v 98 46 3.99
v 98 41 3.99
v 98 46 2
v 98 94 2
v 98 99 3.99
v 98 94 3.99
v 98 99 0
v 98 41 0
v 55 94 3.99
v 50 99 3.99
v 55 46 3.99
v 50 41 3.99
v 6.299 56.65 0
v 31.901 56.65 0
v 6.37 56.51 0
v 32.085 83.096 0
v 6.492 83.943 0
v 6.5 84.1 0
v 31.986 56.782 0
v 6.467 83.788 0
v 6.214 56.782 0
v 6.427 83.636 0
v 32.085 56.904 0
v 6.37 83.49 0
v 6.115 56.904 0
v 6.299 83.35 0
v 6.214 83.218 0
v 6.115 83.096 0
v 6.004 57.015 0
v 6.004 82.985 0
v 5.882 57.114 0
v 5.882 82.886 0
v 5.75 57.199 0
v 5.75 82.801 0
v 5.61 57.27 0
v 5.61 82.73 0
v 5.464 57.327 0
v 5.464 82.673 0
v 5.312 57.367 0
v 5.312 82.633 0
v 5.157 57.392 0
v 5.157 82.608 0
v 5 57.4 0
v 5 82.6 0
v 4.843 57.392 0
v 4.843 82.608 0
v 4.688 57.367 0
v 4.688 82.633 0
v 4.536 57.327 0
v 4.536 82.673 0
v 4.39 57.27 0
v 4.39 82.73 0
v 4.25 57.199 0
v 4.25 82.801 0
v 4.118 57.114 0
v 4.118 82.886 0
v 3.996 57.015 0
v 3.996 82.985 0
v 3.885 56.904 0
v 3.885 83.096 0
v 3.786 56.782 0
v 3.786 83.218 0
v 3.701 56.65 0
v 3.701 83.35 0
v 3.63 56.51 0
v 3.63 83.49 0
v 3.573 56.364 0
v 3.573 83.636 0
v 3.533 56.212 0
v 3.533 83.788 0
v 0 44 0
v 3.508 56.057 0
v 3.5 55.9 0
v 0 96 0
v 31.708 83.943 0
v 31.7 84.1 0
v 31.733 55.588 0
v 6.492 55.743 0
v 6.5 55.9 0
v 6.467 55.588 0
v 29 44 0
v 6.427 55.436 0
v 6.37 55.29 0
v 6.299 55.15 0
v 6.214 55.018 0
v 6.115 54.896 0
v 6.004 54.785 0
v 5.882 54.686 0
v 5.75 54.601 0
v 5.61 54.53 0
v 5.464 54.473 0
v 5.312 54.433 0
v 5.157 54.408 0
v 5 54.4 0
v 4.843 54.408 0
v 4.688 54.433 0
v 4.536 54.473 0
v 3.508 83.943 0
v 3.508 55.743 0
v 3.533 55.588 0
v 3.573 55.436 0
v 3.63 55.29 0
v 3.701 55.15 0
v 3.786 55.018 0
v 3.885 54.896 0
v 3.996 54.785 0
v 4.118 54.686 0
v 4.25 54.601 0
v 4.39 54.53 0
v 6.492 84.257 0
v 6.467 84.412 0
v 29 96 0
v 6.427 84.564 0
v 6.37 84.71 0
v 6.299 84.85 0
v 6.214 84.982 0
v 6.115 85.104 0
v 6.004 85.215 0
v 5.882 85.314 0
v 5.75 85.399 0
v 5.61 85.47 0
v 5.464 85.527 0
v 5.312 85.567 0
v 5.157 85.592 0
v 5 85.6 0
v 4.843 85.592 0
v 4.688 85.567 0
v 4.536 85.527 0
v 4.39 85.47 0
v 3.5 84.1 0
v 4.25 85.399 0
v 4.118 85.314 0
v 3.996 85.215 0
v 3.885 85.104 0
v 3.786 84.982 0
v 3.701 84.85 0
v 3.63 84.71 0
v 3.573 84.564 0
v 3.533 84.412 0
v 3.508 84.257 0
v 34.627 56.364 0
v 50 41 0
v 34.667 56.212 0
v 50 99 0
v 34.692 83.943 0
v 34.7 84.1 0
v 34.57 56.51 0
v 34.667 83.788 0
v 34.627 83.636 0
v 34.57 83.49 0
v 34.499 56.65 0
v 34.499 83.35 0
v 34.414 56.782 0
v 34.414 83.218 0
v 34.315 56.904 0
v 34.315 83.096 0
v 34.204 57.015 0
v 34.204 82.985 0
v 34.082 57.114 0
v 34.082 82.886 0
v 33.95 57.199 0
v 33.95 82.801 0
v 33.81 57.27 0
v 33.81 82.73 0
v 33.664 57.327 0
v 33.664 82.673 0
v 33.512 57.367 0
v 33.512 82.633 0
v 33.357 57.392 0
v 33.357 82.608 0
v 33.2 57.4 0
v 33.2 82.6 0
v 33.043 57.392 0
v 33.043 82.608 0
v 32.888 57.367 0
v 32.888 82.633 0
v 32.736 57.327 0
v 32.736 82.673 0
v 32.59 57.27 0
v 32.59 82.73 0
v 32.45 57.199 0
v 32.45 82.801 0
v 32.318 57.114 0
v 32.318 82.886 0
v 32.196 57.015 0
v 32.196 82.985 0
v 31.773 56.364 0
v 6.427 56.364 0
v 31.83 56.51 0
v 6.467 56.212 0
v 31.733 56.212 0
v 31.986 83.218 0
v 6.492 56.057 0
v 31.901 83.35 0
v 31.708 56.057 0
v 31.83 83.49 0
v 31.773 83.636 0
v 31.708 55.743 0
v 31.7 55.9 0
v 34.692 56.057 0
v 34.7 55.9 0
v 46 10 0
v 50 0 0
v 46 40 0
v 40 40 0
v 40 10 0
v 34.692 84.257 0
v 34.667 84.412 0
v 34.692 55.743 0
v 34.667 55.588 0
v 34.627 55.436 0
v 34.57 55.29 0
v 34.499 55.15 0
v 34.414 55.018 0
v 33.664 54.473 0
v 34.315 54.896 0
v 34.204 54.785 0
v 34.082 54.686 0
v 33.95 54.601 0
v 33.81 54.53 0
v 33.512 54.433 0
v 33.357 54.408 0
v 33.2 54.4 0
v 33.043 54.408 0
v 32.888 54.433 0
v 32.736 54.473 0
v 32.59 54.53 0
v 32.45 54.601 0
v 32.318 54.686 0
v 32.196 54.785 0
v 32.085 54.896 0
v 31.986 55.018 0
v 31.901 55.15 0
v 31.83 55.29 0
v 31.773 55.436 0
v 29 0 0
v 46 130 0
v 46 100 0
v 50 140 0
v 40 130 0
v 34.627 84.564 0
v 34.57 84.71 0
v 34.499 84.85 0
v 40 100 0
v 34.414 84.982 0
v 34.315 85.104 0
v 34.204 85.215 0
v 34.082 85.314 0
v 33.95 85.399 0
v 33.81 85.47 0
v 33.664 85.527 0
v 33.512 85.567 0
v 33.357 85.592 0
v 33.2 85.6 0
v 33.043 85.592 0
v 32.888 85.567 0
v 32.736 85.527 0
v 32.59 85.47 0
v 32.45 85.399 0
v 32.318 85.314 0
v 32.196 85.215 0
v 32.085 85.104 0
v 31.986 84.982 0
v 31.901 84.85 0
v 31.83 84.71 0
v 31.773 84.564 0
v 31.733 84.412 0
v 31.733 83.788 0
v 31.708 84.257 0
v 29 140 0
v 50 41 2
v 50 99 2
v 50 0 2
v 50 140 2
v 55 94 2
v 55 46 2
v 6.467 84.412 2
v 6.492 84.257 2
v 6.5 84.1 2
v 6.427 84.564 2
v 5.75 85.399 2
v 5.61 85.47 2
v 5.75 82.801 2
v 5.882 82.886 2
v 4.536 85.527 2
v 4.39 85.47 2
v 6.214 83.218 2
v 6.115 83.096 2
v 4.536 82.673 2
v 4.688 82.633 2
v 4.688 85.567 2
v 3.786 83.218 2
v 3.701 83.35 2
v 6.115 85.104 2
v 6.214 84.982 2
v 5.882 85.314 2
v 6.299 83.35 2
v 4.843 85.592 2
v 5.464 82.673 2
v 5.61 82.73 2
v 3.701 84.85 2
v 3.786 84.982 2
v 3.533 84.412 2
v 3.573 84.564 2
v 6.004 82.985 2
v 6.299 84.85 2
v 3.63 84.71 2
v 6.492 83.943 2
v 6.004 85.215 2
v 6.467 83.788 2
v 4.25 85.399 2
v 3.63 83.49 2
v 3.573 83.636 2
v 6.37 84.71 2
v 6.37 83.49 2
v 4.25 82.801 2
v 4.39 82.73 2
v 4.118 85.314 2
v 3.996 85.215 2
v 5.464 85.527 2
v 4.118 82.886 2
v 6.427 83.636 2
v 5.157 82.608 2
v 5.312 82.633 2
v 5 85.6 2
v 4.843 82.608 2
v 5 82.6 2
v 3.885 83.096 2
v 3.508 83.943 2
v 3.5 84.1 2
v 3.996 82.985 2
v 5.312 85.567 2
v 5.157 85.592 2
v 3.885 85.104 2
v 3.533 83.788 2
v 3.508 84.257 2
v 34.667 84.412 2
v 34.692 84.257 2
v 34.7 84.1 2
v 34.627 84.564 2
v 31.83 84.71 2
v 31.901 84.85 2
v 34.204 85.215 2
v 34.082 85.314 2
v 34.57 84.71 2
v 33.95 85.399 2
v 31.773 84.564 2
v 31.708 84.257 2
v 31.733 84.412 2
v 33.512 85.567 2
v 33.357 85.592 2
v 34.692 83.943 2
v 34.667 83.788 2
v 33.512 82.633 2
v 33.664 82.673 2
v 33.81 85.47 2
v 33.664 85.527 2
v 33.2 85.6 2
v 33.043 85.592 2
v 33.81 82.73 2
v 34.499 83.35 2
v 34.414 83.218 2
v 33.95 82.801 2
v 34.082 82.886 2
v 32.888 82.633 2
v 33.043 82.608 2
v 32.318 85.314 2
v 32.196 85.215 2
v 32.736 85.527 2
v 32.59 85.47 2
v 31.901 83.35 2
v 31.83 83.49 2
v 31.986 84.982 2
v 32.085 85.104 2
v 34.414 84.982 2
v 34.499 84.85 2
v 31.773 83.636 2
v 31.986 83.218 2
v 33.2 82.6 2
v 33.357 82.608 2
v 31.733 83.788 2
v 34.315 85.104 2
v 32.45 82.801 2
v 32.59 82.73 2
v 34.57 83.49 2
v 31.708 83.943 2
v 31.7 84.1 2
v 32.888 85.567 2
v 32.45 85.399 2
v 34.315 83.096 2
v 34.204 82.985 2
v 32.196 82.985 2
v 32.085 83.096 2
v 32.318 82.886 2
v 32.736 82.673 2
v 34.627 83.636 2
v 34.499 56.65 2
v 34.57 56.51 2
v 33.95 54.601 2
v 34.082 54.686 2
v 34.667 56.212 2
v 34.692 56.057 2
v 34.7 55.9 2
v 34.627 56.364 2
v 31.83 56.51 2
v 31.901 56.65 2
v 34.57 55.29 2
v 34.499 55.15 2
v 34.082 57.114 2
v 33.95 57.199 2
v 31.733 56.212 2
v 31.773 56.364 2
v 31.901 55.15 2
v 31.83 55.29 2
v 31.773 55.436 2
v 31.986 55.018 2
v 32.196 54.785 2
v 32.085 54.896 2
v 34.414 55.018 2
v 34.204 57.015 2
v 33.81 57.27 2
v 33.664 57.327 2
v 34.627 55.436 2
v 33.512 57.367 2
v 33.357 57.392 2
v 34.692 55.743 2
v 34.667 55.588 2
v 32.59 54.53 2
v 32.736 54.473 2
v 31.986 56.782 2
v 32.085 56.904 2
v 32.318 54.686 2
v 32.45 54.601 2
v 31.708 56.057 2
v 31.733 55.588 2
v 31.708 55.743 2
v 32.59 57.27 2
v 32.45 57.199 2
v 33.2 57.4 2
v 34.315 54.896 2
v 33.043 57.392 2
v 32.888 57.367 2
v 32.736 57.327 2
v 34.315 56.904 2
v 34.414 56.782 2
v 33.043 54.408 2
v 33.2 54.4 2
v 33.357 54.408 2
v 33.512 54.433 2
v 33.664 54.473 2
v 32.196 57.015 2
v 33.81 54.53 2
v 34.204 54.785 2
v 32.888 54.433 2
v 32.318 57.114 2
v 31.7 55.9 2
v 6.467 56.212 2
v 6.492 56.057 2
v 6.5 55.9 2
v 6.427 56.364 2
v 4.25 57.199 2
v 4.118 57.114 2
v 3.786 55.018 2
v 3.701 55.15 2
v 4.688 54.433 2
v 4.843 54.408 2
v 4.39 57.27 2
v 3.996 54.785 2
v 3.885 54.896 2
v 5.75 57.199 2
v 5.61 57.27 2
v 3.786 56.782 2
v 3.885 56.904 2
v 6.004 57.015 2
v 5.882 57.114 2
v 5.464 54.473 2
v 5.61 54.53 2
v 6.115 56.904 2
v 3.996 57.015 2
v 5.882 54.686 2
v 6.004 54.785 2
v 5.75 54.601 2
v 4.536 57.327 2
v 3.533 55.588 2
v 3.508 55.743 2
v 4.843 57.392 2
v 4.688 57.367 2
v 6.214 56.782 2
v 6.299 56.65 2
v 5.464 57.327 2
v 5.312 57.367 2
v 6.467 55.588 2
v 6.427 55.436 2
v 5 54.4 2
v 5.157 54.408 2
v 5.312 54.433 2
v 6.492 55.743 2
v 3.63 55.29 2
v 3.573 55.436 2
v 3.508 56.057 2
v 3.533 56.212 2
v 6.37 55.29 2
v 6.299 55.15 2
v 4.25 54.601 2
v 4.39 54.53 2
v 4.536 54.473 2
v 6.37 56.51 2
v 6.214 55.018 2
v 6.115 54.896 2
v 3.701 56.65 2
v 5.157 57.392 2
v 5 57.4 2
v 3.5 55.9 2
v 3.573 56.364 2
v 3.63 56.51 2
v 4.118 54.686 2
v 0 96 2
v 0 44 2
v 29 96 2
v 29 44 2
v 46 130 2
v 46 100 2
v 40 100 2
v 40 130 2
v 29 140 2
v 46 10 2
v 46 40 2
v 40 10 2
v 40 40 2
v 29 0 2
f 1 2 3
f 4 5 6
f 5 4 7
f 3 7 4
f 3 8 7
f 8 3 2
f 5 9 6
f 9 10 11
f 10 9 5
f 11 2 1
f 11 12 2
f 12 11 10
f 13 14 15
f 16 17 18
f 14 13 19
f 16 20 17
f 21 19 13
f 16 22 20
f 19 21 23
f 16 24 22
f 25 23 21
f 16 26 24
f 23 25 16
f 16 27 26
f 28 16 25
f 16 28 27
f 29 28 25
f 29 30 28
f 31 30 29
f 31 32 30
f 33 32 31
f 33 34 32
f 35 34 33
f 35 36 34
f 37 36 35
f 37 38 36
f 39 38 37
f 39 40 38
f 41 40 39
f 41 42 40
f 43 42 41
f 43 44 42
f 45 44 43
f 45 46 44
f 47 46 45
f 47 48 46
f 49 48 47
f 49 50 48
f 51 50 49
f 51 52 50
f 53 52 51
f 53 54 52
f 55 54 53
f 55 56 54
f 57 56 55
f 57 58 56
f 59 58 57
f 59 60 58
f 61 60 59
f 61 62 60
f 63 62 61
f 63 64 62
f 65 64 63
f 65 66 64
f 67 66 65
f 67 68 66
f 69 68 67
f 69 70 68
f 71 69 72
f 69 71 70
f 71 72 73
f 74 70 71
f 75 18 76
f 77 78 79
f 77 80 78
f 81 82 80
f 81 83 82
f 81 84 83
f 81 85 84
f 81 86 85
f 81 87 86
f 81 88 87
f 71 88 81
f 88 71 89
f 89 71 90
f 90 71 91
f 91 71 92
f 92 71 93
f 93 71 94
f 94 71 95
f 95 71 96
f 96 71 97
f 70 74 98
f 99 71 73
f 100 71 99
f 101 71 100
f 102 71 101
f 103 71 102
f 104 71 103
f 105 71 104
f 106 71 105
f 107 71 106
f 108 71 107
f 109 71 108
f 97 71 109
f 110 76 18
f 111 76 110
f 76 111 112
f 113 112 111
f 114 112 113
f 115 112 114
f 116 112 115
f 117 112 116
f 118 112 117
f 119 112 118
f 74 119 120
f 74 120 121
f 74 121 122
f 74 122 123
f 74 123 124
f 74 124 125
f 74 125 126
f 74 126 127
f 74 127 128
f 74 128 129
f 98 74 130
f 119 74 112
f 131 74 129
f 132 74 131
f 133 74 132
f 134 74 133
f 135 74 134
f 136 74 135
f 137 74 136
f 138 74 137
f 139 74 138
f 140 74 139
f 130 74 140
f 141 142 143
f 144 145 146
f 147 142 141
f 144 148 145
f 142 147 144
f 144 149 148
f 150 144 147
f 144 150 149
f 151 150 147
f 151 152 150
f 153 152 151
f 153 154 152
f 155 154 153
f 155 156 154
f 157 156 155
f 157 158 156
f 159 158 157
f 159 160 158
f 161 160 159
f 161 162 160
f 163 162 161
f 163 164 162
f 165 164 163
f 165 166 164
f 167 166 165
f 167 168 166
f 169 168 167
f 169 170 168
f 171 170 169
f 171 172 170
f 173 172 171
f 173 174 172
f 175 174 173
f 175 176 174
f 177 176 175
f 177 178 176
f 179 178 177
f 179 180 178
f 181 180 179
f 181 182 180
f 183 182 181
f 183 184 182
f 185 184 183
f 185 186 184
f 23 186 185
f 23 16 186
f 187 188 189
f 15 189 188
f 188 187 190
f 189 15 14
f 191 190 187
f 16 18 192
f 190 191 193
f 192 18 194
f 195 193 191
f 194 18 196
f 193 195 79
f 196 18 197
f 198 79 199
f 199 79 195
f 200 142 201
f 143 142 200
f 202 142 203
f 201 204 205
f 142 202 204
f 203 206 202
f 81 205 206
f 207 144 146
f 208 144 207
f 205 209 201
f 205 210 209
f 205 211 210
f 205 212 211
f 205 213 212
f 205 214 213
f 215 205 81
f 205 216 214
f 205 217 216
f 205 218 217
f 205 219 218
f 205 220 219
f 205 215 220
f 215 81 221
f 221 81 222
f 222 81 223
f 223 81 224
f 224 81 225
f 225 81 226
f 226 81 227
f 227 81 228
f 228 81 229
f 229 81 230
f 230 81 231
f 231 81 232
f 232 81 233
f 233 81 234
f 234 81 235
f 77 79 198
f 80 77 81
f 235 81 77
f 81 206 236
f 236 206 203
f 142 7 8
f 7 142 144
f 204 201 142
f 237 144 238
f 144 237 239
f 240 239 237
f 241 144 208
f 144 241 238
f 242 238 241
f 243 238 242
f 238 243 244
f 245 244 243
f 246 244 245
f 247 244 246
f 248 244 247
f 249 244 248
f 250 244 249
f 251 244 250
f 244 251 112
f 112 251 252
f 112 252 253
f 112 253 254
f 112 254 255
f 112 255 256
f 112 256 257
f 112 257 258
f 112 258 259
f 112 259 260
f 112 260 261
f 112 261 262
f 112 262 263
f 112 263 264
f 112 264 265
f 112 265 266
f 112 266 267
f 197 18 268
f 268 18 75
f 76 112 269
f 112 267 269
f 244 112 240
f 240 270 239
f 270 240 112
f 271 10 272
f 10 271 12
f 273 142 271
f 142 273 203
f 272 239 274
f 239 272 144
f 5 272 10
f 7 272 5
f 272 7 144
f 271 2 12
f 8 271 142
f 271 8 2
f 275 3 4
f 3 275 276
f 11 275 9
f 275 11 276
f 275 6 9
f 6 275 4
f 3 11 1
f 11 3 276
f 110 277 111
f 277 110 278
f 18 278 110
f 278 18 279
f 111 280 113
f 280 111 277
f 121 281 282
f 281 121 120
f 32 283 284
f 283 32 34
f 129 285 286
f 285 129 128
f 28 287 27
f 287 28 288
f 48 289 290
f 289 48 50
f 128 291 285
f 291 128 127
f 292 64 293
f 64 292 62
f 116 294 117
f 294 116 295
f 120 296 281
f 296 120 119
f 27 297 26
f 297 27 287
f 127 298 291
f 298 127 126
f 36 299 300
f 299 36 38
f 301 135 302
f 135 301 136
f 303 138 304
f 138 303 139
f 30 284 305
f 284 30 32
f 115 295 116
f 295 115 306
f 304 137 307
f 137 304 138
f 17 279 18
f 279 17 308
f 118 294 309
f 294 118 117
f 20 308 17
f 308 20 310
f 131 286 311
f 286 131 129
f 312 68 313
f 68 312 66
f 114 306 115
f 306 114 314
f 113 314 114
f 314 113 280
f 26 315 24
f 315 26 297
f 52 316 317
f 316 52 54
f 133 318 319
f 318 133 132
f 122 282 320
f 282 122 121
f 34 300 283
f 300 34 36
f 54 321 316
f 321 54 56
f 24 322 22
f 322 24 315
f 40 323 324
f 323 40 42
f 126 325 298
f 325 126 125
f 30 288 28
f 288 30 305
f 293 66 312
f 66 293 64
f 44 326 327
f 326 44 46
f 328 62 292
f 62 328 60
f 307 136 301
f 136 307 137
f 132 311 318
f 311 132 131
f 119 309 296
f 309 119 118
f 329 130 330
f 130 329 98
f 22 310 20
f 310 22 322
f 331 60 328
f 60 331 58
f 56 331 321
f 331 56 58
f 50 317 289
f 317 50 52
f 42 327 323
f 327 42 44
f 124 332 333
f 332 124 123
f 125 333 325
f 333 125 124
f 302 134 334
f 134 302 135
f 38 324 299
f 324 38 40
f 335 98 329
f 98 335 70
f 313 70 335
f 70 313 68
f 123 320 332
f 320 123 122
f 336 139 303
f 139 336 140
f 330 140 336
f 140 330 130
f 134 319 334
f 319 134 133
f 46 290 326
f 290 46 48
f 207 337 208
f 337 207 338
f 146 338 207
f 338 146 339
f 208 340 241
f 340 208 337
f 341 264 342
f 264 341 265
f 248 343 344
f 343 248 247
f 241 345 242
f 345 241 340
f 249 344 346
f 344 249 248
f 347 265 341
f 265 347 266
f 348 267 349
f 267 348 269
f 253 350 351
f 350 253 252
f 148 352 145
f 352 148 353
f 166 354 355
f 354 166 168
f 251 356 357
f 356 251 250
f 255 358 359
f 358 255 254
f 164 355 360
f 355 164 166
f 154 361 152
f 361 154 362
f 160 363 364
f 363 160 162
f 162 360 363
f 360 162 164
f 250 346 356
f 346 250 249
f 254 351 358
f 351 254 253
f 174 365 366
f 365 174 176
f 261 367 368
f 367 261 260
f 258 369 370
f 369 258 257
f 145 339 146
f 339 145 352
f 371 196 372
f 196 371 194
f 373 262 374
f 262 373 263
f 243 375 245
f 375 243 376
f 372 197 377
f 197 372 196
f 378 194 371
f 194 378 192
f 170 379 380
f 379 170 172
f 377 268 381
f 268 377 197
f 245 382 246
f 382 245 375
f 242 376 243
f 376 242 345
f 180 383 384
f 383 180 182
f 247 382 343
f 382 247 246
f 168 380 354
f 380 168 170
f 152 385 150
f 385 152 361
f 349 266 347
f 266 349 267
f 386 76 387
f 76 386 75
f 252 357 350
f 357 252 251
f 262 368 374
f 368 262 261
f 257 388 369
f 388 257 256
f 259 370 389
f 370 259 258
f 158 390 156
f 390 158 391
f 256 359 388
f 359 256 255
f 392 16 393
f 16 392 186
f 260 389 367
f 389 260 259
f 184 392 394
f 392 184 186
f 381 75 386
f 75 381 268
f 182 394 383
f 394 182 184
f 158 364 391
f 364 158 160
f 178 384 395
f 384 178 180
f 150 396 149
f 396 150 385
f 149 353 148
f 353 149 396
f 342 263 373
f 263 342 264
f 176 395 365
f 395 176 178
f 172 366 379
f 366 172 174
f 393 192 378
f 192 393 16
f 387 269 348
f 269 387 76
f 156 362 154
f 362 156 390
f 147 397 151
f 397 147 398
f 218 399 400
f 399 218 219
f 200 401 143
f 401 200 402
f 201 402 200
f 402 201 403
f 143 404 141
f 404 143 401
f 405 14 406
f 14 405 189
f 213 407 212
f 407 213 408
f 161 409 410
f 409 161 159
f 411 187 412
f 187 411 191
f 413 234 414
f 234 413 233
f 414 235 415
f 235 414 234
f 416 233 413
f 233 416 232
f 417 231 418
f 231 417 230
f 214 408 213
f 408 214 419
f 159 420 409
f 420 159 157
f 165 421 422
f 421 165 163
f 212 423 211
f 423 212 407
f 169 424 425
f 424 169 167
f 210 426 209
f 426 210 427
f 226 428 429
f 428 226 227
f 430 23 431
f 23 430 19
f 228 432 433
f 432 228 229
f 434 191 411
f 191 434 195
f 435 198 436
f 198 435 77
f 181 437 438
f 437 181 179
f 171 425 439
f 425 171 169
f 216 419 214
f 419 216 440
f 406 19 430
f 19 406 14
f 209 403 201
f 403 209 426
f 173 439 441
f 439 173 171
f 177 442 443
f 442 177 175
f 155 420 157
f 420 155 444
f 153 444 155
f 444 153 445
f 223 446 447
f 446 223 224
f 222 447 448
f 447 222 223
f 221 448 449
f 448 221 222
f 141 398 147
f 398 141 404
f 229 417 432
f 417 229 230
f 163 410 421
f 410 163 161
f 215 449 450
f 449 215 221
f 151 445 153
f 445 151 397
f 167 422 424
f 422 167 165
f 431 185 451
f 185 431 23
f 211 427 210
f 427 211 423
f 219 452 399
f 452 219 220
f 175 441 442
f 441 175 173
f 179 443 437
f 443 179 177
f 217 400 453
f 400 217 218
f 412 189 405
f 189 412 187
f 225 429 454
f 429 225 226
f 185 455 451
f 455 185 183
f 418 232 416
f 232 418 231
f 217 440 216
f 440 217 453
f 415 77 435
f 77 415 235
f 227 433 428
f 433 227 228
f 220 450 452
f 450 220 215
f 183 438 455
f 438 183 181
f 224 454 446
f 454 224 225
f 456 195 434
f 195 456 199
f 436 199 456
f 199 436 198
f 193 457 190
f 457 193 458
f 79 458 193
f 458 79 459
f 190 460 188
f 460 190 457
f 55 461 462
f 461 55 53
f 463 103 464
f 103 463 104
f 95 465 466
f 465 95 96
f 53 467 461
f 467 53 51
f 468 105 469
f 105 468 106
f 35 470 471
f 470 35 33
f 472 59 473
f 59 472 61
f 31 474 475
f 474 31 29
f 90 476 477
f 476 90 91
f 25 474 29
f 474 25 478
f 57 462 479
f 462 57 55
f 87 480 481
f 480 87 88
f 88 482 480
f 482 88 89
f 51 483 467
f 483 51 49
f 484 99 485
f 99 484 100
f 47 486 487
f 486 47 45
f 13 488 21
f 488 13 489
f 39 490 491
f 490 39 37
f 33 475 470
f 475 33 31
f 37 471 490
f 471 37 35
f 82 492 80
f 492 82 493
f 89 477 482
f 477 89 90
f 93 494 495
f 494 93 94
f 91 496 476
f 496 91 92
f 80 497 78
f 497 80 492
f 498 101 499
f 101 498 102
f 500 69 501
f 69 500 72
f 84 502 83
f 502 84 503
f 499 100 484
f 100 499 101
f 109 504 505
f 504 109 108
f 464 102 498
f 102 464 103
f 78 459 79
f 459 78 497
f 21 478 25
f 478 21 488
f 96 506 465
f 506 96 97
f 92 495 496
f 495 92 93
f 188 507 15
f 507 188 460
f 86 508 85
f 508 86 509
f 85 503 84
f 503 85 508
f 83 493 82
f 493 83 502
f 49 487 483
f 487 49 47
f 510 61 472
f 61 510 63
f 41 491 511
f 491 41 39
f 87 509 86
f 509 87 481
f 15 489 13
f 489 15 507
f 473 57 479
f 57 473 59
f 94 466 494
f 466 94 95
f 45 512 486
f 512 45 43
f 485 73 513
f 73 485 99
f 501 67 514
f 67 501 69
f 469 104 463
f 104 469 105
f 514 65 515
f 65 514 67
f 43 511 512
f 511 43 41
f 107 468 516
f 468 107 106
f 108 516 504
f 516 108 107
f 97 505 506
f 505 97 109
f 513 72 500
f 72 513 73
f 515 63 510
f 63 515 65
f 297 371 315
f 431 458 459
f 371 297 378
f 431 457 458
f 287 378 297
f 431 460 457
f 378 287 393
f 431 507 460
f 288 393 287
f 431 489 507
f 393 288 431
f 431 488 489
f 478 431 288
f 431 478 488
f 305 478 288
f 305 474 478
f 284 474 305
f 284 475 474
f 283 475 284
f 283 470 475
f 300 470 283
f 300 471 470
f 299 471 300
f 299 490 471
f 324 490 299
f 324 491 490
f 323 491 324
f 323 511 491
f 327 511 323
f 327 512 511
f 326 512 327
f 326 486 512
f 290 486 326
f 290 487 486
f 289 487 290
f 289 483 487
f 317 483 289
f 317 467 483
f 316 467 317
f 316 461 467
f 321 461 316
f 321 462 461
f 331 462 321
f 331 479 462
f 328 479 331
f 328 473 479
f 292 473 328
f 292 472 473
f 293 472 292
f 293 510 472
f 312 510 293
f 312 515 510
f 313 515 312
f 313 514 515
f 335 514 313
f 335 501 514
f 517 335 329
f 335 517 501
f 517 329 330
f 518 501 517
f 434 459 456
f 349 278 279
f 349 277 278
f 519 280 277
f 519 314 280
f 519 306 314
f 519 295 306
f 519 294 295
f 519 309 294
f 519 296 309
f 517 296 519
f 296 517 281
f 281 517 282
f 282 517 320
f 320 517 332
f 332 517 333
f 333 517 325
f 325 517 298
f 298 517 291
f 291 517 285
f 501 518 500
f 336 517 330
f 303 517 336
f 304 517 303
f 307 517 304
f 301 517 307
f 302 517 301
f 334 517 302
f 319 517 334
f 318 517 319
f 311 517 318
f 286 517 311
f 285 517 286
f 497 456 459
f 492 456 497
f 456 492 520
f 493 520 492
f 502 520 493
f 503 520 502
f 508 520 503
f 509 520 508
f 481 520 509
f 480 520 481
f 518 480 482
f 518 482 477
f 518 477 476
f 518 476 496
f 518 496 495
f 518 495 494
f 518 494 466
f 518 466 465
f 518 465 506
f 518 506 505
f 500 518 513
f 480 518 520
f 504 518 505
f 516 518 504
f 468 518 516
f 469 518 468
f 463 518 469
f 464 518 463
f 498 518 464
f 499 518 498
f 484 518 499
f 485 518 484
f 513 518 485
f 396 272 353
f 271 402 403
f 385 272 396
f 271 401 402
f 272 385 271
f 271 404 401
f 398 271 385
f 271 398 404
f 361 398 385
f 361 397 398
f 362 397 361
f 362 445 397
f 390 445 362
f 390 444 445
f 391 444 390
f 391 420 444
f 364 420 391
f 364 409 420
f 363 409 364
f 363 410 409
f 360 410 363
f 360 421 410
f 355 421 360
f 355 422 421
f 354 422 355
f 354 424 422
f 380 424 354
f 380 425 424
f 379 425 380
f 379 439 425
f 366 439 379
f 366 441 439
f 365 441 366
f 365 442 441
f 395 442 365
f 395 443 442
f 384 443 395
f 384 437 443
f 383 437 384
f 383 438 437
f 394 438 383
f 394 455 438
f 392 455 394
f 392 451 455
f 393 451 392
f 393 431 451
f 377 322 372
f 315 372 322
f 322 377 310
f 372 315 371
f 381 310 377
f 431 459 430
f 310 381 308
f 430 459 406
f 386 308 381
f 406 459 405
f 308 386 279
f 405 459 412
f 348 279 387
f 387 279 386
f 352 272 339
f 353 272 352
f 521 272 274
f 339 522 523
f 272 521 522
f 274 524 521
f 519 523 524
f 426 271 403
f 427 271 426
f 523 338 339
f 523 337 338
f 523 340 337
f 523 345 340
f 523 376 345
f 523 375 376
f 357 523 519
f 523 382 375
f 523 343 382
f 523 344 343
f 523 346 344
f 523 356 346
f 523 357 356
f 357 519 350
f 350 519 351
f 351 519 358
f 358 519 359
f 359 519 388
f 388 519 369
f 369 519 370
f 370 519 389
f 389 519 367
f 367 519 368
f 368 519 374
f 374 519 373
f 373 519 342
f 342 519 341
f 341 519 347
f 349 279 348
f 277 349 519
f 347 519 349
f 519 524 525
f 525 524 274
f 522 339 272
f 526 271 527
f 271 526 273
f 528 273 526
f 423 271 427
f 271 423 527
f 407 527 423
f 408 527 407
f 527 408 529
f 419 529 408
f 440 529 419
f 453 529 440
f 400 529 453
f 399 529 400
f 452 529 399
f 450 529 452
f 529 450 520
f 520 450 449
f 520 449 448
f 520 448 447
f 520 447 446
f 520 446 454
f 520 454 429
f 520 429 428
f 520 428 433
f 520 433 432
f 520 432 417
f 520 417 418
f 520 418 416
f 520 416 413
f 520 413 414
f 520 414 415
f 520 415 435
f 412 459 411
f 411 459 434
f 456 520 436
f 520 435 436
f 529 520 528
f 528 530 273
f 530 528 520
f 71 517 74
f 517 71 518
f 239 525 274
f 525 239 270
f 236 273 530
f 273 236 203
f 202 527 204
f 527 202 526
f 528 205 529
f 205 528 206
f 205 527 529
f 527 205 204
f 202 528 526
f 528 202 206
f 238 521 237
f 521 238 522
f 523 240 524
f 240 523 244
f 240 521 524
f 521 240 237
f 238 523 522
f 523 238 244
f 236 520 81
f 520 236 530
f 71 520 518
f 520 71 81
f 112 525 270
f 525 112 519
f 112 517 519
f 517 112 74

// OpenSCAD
pcb_wid = 48;
pcb_len = 180;
pcb_thk = 2;

plate_wid = 140;
plate_thk = 2;
plate_len = 50;

lidar_hole_diam = 3;

mounts_wid = 6;
mounts_len = 30;

lidar_pts  = [
    [0,   28.2],
    [28.2, 28.2],
    [28.2, 0],
    [0, 0]
];

pcb_pts = [
    [5,  0],
    [5, 38]
];
module plate_body() {
    cube([plate_len, plate_wid, plate_thk], center=false);
}

module plate_body2() {
    cube([pcb_wid, pcb_wid + 10, plate_thk+1.99], center=false);
}

module plate_body3() {
    cube([pcb_wid+1, pcb_wid, plate_thk], center=false);
}


module drill_hole(x, y, d) {
    translate([x, y, -0.1]) 
        cylinder(h=plate_thk + 0.2, r=d/2, $fn=60);
}

module drill_mount(x, y) {
    translate([x, y, -0.1]) 
        cube([mounts_wid, mounts_len, plate_thk + 0.2]);
}

module drill_add(x, y) {
    translate([x, y, -0.1]) 
        cube([30, 45, plate_thk + 0.2]);
}


module lidar_holes() {
    for (pt = lidar_pts) {
        drill_hole(pt[0], pt[1], lidar_hole_diam);
    }
}

module pcb_holes() {
    for (pt = pcb_pts) {
        drill_hole(pt[0], pt[1], lidar_hole_diam);
    }
}


union(){
    difference(){
    translate([50,(plate_wid - pcb_wid)/2-5, 0])
        plate_body2();
    translate([55,(plate_wid - pcb_wid)/2, 2])
        plate_body3();
        pcb_holes();
    }
    difference() {
        plate_body();
        translate([5, 55.9, 0])
        lidar_holes();
        drill_mount(40,10);
        drill_mount(40,100);
        drill_add(-1, -1);
        drill_add(-1, 96);
    }
}
